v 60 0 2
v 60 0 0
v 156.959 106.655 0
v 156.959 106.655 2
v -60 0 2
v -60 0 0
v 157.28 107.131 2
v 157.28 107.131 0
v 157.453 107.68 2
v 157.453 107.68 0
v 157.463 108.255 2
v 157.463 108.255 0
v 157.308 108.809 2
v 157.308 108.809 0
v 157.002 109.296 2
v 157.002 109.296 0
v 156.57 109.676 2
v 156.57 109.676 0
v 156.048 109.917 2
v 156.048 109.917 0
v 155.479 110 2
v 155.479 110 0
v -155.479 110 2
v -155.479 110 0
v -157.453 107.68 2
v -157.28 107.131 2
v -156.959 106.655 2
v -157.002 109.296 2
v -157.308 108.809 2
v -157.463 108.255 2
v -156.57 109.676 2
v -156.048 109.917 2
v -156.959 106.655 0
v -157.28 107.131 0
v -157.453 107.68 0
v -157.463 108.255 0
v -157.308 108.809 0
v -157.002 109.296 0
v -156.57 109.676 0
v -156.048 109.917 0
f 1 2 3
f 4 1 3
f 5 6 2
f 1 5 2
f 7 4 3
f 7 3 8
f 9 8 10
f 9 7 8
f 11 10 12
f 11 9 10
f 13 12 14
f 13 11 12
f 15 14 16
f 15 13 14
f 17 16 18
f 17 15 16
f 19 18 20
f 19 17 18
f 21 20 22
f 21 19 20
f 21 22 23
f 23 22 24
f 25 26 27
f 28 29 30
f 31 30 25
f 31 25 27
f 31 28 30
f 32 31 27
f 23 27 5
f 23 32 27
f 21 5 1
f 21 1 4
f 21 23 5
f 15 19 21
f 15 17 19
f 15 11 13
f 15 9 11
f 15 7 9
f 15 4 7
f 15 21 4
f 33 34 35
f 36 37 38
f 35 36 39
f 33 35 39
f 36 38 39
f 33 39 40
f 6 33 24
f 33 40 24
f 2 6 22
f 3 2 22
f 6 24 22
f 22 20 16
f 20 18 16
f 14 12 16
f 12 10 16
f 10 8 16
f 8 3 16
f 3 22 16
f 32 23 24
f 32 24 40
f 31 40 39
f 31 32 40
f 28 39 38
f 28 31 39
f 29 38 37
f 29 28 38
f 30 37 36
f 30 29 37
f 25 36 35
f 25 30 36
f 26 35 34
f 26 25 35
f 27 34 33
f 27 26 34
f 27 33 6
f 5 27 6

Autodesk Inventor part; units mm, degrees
ref_plane "YZ Plane" through (0, 0, 0) normal (1, 0, 0) x (0, 1, 0)
ref_plane "XZ Plane" through (0, 0, 0) normal (0, 1, 0) x (-1, 0, 0)
ref_plane "XY Plane" through (0, 0, 0) normal (0, 0, 1) x (1, 0, 0)
sketch "Sketch1" plane through (0, 0, 0) normal (0, 0, 1) x (1, 0, 0)
  line L0 (-160, 110) -> (-60, 0)
  line L1 (-60, 0) -> (60, 0)
  line L2 (60, 0) -> (160, 110)
  line L3 (160, 110) -> (-160, 110)
  point P0 (0, 0)
  point P1 (0, 0)
  point P2 (0, 110)
  dimension "d0" = 110
  dimension "d1" = 120
  dimension "d2" = 320
extrude "Plate1" add sketch "Sketch1" along normal blind 2
fillet "Corner Round1" radius 2 2 edges at (160, 110, 1) (-160, 110, 1)
equation "\"d3\" = Thickness"
equation "\"BendRadius\" = Thickness"
equation "\"BendReliefWidth\" = Thickness"
equation "\"BendReliefDepth\" = 0.5 * Thickness"
equation "\"CornerReliefSize\" = 4 * Thickness"
equation "\"MinimumRemnant\" = 2 * Thickness"
equation "\"TransitionRadius\" = BendRadius"
equation "\"JacobiRadiusSize\" = BendRadius"
equation "\"GapSize\" = Thickness"
equation "\"Thickness\" = 2"
properties part number "ДМФ 052 торец лотка кормовой v2.0"
